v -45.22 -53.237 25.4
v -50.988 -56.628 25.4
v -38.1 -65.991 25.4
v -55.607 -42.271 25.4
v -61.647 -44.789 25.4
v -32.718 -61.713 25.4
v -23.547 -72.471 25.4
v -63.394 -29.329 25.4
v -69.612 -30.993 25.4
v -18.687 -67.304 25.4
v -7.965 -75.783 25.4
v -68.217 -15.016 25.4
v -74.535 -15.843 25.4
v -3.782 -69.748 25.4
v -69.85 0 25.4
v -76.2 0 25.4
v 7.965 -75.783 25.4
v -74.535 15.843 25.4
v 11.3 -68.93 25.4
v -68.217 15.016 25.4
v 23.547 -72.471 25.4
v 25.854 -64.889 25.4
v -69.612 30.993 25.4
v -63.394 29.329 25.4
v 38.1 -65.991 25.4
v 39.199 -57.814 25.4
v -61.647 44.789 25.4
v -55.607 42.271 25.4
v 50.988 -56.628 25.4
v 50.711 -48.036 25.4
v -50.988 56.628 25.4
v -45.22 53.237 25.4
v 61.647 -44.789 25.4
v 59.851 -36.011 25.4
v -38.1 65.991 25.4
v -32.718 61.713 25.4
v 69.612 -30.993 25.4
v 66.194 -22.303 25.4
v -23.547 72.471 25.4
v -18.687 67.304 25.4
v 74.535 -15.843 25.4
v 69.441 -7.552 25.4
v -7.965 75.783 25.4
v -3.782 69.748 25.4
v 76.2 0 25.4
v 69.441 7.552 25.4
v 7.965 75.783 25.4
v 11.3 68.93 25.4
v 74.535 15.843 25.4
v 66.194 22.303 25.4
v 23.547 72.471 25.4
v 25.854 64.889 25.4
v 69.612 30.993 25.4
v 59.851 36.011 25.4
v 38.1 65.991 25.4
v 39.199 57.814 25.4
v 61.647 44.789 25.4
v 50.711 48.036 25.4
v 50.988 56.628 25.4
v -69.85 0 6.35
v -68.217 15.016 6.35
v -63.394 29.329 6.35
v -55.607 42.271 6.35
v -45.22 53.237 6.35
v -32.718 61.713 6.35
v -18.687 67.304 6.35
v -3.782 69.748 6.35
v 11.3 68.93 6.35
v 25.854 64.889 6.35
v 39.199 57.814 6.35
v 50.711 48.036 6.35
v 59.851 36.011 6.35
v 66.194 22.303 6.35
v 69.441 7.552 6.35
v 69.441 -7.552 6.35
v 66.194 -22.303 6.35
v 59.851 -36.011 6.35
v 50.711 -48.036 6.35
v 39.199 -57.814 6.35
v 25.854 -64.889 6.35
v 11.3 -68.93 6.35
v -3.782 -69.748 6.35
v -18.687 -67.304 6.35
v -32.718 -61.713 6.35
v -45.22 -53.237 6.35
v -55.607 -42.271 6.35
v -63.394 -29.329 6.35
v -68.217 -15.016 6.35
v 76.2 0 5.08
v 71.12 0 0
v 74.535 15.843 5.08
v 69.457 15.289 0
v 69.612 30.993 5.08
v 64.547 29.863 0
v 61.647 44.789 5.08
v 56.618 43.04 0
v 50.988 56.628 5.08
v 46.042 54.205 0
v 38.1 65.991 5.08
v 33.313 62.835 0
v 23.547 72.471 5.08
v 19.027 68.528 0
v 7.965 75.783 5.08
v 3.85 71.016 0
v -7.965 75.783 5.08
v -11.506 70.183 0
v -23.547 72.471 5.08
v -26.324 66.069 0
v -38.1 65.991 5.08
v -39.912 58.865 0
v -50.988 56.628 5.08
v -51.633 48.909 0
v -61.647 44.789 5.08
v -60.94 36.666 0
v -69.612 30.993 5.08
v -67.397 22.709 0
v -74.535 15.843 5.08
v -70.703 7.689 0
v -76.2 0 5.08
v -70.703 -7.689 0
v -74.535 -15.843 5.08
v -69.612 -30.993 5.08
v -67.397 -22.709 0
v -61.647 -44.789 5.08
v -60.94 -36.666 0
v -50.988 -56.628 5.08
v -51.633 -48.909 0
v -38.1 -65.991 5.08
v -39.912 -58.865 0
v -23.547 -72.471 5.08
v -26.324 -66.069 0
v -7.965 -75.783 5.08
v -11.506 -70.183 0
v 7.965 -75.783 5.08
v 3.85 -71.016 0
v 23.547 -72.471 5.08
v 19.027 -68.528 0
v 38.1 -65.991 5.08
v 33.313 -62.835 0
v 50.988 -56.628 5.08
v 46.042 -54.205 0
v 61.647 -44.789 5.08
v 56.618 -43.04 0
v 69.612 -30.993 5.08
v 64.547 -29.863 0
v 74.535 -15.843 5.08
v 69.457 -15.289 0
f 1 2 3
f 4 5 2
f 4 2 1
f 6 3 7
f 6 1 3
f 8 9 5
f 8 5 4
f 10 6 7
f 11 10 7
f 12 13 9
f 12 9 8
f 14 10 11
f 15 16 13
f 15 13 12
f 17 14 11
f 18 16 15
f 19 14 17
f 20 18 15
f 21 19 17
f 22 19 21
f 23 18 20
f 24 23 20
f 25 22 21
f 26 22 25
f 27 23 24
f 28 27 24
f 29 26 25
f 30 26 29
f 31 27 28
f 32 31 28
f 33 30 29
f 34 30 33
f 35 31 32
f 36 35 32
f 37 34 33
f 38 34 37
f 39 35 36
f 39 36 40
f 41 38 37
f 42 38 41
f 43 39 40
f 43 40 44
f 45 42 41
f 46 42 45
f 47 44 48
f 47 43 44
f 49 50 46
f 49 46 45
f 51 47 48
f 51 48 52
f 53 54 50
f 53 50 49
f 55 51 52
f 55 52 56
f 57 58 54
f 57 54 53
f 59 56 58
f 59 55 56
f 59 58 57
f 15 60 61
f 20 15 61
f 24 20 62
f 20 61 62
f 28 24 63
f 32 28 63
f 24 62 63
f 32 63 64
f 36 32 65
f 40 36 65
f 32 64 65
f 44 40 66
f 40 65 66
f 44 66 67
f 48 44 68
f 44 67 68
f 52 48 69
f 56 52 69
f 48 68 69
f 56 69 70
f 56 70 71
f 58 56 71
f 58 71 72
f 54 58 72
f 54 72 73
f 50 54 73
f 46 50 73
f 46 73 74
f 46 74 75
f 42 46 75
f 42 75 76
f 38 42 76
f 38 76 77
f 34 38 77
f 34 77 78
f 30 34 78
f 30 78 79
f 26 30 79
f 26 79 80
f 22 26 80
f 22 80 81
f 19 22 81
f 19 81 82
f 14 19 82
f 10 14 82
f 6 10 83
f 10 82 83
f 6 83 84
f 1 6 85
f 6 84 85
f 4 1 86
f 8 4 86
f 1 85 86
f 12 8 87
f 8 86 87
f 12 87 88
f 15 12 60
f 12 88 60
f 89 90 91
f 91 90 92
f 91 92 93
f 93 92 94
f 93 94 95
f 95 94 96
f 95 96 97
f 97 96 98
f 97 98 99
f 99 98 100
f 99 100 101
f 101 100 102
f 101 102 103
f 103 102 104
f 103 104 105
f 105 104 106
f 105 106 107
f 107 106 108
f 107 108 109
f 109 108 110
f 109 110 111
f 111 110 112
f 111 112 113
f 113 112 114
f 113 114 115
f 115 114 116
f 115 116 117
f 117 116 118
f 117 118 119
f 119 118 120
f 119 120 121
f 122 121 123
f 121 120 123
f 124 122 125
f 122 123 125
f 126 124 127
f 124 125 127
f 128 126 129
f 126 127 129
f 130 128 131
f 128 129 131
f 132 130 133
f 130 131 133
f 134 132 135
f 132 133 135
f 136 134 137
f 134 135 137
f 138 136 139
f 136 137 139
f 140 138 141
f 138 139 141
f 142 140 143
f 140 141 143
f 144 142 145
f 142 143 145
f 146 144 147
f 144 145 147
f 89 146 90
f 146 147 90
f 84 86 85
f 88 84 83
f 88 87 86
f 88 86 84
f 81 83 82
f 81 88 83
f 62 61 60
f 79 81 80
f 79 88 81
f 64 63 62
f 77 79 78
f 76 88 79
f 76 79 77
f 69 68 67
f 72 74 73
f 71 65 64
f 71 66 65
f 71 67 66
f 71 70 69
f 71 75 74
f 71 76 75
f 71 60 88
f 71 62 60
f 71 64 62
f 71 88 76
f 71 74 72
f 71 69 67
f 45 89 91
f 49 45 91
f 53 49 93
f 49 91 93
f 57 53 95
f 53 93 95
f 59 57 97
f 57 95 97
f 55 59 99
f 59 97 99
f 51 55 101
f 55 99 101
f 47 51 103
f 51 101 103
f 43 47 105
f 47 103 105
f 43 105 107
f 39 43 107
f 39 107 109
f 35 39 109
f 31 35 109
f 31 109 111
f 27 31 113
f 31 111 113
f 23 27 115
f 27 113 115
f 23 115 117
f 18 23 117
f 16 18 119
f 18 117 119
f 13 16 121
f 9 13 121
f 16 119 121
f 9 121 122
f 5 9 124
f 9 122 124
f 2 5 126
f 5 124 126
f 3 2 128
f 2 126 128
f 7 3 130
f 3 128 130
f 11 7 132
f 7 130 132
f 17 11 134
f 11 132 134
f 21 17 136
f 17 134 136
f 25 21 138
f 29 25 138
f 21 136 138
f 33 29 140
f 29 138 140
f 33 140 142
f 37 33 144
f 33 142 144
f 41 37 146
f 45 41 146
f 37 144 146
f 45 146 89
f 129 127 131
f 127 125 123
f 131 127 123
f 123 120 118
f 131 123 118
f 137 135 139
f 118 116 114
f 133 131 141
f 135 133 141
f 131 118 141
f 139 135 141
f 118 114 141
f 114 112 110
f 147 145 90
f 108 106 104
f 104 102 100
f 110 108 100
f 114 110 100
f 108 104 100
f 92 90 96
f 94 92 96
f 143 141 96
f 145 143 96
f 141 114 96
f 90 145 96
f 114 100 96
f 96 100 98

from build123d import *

# Parameters (mm, degrees)
F0_R     = 76.2
F1_DEPTH = 25.4
F2_SIZE  = 5.08
F4_D     = 139.7
F5_R     = 69.85
F6_DEPTH = 6.35


with BuildPart() as f1:
    # F0 (on Top) → F1 (new body)
    with BuildSketch(Plane.XY):
        Circle(F0_R)
    extrude(amount=F1_DEPTH)

    # F2
    f2_edges = [f1.edges().sort_by_distance(p)[0] for p in [
        (-76.2, 0, 0),
    ]]
    chamfer(f2_edges, length=F2_SIZE)

    # F4 (through all)
    with Locations(Plane.XY.offset(25.4)):
        with Locations((0, 0)):
            Hole(F4_D / 2)

    # F5 (on Top) → F6 (join)
    with BuildSketch(Plane.XY):
        Circle(F5_R)
    extrude(amount=F6_DEPTH)


solid = f1.part
